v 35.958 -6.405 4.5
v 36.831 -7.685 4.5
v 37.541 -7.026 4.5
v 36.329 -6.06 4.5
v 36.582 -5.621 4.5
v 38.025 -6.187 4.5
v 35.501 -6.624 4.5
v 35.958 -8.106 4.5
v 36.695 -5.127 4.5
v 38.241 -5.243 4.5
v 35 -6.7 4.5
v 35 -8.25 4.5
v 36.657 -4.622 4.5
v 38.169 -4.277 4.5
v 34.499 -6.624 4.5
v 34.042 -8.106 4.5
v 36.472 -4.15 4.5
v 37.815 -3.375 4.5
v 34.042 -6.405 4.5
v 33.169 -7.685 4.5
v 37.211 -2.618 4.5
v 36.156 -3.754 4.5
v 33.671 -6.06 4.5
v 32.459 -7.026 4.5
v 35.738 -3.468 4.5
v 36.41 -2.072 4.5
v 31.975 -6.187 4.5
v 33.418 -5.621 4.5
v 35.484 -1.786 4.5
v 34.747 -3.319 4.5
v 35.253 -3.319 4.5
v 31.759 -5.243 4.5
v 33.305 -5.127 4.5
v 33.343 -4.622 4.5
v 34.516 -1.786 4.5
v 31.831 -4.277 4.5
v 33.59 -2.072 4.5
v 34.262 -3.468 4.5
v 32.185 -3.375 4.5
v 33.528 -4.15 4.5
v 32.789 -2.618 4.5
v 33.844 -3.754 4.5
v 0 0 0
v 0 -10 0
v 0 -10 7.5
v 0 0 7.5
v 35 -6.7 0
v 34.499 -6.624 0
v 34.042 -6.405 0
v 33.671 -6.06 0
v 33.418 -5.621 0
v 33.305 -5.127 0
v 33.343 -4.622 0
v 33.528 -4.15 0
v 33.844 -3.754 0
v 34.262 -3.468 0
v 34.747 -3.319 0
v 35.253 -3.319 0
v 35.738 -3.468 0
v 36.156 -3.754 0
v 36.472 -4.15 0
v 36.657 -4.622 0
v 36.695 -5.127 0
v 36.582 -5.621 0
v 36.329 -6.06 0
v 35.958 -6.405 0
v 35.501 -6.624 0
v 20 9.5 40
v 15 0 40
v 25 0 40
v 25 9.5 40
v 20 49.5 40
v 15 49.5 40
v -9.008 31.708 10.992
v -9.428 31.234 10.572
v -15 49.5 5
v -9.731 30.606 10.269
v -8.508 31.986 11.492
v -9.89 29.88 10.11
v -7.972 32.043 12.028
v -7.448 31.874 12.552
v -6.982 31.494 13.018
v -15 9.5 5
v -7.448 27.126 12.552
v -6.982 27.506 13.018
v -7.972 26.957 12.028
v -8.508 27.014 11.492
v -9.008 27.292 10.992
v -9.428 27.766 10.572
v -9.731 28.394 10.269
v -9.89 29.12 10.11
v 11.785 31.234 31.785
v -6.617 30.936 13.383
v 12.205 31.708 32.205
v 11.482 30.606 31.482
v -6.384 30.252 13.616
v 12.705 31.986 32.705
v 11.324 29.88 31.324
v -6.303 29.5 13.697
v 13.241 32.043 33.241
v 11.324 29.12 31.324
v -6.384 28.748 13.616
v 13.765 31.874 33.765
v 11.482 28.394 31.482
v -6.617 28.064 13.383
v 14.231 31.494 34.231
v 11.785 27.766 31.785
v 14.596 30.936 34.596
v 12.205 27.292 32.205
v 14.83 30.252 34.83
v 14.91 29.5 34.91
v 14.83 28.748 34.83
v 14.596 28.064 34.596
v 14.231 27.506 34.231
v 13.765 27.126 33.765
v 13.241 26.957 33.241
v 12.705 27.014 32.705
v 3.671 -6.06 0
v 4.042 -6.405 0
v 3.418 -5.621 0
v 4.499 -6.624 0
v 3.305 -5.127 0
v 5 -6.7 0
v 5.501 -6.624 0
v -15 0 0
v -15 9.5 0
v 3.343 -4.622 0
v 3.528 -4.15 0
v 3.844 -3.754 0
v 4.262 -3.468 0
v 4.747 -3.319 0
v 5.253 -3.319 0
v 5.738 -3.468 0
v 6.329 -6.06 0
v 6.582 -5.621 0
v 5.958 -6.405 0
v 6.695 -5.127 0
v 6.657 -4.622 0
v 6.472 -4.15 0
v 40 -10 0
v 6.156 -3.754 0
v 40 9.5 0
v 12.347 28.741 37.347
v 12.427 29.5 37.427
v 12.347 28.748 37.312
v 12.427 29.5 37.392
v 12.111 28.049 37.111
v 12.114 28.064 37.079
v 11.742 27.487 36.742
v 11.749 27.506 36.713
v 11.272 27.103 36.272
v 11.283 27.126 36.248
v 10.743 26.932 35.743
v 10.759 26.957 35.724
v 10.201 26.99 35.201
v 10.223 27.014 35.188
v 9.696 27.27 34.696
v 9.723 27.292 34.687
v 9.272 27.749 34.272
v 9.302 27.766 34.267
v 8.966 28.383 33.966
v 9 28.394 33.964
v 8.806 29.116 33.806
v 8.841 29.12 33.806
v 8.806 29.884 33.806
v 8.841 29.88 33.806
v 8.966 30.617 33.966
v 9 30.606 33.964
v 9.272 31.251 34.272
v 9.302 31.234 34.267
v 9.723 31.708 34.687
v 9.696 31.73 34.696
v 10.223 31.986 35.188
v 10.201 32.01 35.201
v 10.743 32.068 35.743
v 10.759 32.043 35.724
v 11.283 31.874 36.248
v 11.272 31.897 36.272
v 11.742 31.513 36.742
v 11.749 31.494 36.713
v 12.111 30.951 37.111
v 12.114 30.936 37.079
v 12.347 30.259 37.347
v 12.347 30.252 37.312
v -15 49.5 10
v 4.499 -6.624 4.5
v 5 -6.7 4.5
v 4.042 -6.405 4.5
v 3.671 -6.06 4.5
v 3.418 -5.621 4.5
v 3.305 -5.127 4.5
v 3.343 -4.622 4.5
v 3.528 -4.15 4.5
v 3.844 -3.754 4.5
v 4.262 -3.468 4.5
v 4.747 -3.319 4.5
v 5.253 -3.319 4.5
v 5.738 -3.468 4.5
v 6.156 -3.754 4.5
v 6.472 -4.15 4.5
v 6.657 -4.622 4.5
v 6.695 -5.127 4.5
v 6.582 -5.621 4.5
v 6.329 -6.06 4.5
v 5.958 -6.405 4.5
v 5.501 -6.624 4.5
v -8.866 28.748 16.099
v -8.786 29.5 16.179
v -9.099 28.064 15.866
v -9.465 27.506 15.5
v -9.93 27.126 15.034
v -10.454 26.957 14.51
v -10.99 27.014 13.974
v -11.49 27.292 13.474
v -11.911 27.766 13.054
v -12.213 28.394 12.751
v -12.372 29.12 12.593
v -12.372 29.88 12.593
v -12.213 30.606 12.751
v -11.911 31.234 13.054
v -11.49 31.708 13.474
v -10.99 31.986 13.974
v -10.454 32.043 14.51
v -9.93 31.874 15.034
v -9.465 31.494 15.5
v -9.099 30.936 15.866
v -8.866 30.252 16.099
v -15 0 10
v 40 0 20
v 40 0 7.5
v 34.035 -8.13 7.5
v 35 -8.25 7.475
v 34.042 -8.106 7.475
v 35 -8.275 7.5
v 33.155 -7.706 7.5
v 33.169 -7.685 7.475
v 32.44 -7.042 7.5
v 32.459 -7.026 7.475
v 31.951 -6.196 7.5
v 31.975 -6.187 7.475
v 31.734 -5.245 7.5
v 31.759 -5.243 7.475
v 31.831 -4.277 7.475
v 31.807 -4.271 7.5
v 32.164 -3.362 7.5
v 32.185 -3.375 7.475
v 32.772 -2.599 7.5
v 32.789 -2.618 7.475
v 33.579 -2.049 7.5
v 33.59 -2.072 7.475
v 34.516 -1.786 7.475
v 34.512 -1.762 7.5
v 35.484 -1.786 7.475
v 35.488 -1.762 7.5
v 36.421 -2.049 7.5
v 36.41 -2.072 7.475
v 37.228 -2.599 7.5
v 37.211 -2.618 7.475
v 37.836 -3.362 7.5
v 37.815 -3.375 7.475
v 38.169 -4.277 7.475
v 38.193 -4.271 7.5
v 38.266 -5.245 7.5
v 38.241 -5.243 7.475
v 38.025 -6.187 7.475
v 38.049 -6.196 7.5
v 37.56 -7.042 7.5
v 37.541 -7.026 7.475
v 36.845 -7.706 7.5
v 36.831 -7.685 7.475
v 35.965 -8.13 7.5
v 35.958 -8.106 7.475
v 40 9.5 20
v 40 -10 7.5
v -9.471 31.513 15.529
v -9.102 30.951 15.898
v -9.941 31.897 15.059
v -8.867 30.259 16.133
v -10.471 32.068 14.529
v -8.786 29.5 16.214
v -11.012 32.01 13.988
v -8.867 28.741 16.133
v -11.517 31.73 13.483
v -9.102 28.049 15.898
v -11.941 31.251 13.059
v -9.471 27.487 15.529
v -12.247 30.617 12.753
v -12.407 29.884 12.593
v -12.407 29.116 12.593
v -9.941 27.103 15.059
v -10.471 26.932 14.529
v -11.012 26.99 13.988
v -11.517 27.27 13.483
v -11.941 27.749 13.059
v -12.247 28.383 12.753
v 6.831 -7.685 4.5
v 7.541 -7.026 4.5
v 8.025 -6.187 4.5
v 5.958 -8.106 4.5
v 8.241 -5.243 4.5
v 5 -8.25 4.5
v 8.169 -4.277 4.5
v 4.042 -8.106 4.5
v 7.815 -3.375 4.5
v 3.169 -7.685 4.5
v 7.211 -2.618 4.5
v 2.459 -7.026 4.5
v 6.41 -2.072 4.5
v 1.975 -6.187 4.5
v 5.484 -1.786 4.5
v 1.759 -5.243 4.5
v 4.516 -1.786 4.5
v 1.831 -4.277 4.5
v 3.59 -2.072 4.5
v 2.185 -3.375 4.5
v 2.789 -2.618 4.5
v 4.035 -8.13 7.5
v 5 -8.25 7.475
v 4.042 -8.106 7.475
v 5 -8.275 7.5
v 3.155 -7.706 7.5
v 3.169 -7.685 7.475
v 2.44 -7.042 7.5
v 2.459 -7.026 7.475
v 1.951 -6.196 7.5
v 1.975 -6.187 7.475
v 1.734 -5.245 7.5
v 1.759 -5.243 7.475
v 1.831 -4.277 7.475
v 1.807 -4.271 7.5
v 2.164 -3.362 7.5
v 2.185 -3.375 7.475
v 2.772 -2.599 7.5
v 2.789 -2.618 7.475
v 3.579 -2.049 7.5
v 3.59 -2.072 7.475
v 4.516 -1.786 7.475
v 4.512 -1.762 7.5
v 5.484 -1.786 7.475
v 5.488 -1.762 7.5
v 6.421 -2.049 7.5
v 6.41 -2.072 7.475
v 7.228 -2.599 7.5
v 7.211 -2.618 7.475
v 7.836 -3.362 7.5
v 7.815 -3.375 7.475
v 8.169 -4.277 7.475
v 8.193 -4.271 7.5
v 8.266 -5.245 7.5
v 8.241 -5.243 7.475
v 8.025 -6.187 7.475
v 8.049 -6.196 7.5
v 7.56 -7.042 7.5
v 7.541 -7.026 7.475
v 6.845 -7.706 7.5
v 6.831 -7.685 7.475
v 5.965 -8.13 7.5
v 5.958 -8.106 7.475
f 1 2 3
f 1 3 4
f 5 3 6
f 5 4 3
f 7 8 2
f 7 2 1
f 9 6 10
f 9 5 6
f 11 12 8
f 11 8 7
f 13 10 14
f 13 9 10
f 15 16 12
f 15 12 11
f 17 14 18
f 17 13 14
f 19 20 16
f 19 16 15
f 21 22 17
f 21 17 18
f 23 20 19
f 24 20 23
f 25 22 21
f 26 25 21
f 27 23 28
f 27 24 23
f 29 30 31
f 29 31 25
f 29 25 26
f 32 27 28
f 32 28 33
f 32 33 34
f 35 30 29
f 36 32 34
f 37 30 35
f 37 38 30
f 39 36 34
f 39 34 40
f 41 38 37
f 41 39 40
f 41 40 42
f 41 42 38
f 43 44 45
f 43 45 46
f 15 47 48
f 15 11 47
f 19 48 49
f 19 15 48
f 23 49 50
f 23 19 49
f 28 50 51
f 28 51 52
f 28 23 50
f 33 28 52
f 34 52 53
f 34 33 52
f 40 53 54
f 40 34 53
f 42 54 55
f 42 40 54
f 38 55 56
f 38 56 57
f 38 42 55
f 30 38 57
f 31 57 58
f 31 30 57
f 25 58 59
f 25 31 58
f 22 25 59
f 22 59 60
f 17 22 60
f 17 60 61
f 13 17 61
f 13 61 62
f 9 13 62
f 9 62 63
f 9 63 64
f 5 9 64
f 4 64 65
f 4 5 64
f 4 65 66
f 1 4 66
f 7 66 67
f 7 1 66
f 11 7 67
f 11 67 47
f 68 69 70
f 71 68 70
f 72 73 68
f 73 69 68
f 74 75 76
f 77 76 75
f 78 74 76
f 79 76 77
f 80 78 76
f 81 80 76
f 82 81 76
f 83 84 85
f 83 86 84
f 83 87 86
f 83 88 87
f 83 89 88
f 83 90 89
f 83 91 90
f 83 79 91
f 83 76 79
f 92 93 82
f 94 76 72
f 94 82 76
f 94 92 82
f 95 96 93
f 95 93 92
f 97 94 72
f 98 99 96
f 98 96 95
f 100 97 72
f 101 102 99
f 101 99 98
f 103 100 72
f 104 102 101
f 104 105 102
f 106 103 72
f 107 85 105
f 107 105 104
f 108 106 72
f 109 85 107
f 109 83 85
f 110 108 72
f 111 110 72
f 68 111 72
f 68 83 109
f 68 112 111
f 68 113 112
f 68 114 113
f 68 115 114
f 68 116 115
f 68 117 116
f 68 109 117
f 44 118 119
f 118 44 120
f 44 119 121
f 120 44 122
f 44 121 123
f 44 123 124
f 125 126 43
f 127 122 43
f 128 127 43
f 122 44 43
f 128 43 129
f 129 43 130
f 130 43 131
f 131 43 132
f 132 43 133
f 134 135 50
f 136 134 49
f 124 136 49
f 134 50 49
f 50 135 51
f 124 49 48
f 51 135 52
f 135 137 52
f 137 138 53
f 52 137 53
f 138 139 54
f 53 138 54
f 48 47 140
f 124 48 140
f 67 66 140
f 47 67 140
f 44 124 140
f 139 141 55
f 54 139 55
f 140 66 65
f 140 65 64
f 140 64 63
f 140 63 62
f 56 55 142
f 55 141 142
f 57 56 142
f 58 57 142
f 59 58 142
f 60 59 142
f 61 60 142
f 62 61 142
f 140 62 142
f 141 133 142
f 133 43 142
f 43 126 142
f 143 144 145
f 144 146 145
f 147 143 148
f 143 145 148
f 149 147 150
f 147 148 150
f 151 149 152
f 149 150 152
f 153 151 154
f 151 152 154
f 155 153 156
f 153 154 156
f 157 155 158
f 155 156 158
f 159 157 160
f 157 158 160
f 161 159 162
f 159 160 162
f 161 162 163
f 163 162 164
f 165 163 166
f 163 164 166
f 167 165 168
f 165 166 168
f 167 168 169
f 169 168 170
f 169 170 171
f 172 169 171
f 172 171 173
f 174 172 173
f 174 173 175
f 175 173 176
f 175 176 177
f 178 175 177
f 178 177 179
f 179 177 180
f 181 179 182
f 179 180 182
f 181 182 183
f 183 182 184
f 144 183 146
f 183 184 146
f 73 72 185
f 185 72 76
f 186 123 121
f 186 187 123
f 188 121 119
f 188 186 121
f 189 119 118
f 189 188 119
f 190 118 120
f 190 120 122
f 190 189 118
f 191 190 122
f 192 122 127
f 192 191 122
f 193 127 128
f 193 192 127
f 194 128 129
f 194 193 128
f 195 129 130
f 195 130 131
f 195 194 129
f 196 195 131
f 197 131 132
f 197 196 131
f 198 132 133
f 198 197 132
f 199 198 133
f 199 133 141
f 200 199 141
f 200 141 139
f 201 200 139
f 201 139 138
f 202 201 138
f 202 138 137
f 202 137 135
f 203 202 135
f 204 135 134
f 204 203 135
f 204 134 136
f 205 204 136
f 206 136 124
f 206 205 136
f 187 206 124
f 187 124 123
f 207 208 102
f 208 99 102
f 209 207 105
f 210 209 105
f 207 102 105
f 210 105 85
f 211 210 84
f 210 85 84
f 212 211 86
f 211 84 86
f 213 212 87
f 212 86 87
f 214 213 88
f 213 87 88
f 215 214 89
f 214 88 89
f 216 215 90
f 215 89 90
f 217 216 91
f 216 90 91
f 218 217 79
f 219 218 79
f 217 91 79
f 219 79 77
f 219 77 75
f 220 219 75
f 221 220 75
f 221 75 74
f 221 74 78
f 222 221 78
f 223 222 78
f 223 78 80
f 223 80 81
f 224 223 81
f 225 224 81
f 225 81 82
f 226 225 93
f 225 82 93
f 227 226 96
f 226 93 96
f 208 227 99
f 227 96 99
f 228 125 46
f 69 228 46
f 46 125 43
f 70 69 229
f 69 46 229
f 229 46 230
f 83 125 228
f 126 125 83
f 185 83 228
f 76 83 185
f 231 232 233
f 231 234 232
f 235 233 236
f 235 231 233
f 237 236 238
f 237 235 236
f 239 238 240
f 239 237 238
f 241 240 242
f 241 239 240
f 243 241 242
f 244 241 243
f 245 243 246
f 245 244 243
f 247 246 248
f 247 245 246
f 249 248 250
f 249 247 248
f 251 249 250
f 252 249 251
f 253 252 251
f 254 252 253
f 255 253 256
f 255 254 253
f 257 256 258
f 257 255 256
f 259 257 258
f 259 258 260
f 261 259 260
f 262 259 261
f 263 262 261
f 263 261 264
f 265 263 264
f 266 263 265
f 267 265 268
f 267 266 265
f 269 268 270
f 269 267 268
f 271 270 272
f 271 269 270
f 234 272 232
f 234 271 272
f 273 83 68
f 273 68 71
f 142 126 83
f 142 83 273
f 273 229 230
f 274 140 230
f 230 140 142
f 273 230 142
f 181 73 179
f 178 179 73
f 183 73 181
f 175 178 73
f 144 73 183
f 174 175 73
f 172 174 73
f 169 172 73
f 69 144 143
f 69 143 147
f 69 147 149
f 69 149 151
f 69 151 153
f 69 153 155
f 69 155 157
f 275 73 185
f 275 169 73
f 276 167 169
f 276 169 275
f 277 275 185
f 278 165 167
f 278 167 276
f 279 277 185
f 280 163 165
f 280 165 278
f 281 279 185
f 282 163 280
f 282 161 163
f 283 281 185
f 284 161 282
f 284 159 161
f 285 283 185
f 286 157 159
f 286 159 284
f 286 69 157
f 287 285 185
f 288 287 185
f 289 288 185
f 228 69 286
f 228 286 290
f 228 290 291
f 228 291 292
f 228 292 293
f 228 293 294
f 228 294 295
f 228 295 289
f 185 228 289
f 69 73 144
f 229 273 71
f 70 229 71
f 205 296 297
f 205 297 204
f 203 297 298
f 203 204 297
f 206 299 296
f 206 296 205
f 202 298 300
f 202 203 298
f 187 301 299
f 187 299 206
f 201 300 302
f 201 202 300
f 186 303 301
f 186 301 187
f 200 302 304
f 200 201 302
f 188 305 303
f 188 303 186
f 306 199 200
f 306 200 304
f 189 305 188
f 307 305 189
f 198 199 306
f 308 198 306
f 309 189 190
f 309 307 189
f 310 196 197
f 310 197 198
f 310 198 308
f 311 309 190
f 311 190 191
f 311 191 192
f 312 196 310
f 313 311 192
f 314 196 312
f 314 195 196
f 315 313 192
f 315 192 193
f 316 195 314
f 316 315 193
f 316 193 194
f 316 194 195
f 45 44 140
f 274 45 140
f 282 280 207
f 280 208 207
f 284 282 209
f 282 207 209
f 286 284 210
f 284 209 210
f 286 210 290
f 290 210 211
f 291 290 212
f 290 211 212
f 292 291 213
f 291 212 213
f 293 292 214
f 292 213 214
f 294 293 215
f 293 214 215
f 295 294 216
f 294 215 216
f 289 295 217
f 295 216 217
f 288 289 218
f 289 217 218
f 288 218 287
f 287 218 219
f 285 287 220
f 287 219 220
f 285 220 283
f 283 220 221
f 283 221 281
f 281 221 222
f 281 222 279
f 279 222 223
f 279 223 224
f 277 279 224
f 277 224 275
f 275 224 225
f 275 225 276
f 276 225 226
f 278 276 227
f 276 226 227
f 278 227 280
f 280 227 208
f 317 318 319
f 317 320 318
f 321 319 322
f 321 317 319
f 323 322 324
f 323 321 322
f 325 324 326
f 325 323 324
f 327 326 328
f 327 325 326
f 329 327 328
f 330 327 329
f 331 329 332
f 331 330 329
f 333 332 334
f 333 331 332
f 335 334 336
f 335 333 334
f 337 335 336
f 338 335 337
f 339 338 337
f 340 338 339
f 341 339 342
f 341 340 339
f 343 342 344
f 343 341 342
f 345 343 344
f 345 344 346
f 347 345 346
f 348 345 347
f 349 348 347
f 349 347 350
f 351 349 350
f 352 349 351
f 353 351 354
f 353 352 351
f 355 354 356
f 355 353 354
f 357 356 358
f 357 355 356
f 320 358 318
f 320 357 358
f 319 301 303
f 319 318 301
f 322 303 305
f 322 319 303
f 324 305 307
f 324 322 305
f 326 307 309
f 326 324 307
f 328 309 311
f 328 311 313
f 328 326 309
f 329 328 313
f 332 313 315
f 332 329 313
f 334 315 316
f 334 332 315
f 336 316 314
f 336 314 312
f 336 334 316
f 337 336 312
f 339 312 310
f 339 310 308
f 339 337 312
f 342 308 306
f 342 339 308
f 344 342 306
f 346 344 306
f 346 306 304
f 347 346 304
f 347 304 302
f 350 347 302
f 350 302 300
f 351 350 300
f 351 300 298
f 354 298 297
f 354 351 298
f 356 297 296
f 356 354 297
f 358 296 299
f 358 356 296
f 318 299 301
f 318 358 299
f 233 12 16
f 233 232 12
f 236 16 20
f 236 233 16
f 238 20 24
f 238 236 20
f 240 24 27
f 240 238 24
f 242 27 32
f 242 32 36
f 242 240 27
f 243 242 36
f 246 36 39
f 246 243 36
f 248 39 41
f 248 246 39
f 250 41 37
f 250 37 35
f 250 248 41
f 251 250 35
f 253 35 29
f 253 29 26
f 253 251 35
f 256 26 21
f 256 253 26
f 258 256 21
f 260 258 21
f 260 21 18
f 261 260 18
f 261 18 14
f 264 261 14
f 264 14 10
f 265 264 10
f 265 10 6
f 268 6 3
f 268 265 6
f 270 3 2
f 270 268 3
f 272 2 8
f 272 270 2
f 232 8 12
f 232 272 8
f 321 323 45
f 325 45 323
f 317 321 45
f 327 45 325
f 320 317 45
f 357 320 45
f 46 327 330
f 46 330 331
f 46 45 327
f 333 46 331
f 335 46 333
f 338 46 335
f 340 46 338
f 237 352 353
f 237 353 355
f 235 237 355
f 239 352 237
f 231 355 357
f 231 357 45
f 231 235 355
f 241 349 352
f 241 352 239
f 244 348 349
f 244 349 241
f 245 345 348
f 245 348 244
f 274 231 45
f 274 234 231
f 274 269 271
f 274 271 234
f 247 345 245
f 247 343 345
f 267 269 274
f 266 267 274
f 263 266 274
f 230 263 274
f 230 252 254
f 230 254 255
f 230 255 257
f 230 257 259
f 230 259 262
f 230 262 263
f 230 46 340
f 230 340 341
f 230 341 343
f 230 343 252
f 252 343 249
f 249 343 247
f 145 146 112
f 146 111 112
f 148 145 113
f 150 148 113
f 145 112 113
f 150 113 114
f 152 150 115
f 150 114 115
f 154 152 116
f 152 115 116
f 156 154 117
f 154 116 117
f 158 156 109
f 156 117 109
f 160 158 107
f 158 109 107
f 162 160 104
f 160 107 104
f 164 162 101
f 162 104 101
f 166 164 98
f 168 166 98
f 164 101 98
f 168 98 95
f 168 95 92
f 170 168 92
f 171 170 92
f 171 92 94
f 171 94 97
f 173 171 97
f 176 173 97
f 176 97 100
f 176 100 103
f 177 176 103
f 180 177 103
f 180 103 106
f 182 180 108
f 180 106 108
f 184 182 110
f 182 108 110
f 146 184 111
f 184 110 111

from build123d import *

# Parameters (mm, degrees)
SKETCH1_W                     = 40
SKETCH1_H                     = 10
BOSS_EXTRUDE1_DEPTH           = 7.5
CBORE_FOR_M3_SHCS1_AT_2_COUNT = 2
CBORE_FOR_M3_SHCS1_AT_2_PITCH = 30
SKETCH4_W                     = 55
SKETCH4_H                     = 9.5
BOSS_EXTRUDE2_DEPTH           = 40
BOSS_EXTRUDE3_DEPTH           = 40
CUT_EXTRUDE1_DEPTH            = 70.282032303
CUT_EXTRUDE2_DEPTH            = 70.282032303


# Read off the part's stored shape, not the designer's step: Ø5.1 (5.1) Diameter Hole1
with BuildPart() as part:
    # Sketch1 → Boss-Extrude1 (new body)
    with BuildSketch(Plane.XY):
        with Locations((20, -5)):
            Rectangle(SKETCH1_W, SKETCH1_H)
    extrude(amount=BOSS_EXTRUDE1_DEPTH)

    # Sketch3 → CBORE for M3 SHCS1 (revolve, cut)
    with BuildSketch(Plane(origin=(35, -5, 7.5), x_dir=(0, -1, 0), z_dir=(1, 0, 0))):
        Polygon((0, 0), (0, 7.5), (1.7, 7.5), (1.7, 3), (3.25, 3), (3.25, 0.025), (3.275, 0), align=None)
    cbore_for_m3_shcs1 = revolve(axis=Axis((35, -5, 13.85), (0, 0, -1)), mode=Mode.SUBTRACT)

    # CBORE for M3 SHCS1 at 2: CBORE for M3 SHCS1 ×2
    with Locations(*[(-i * CBORE_FOR_M3_SHCS1_AT_2_PITCH, 0, 0) for i in range(1, CBORE_FOR_M3_SHCS1_AT_2_COUNT)]):
        add(cbore_for_m3_shcs1, mode=Mode.SUBTRACT)

    # Sketch4 → Boss-Extrude2 (add)
    with BuildSketch(Plane.XY):
        with Locations((12.5, 4.75)):
            Rectangle(SKETCH4_W, SKETCH4_H)
    extrude(amount=BOSS_EXTRUDE2_DEPTH)

    # Sketch5 → Boss-Extrude3 (add)
    with BuildSketch(Plane(origin=(0, 9.5, 0), x_dir=(1, 0, 0), z_dir=(0, 1, 0))):
        Polygon((-15, -5), (20, -40), (15, -40), (-15, -10), align=None)
    extrude(amount=BOSS_EXTRUDE3_DEPTH)

    # Sketch7 → Cut-Extrude1 (cut, through all)
    with BuildSketch(Plane(origin=(0, 9.5, 0), x_dir=(1, 0, 0), z_dir=(0, 1, 0))):
        Polygon((15, -40), (-15, -10), (-15, -40), align=None)
    extrude(amount=-CUT_EXTRUDE1_DEPTH, mode=Mode.SUBTRACT)

    # Ø5.1 (5.1) Diameter Hole1 outline → Ø5.1 (5.1) Diameter Hole1 (revolve, cut)
    with BuildSketch(Plane(origin=(23.106601718, 29.5, 23.106601718), x_dir=(0.7071067811865471, 0, 0.707106781186548), z_dir=(0, 1, 0))):
        Polygon((2.55, -17.65266953), (2.55, -14.142135624), (0, -14.142135624), (0, -17.67766953), (2.575, -17.67766953), align=None)
    revolve(axis=Axis((23.106601718, 29.5, 23.106601718), (0.707106781186548, 0, -0.7071067811865471)), mode=Mode.SUBTRACT)

    # 5.1 _5.1_ Diameter Hole1 2 outline → 5.1 _5.1_ Diameter Hole1 2 (revolve, cut)
    with BuildSketch(Plane(origin=(1.893398282, 29.5, 1.893398282), x_dir=(0.7071067811865471, 0, 0.707106781186548), z_dir=(0, 1, 0))):
        Polygon((2.55, -17.65266953), (2.55, -14.142135624), (0, -14.142135624), (0, -17.67766953), (2.575, -17.67766953), align=None)
    revolve(axis=Axis((1.893398282, 29.5, 1.893398282), (0.707106781186548, 0, -0.7071067811865471)), mode=Mode.SUBTRACT)

    # Sketch11 → Cut-Extrude2 (cut, through all)
    with BuildSketch(Plane(origin=(0, 9.5, 0), x_dir=(1, 0, 0), z_dir=(0, 1, 0))):
        Polygon((40, -20), (25, -40), (40, -40), align=None)
    extrude(amount=-CUT_EXTRUDE2_DEPTH, mode=Mode.SUBTRACT)


solid = part.part
